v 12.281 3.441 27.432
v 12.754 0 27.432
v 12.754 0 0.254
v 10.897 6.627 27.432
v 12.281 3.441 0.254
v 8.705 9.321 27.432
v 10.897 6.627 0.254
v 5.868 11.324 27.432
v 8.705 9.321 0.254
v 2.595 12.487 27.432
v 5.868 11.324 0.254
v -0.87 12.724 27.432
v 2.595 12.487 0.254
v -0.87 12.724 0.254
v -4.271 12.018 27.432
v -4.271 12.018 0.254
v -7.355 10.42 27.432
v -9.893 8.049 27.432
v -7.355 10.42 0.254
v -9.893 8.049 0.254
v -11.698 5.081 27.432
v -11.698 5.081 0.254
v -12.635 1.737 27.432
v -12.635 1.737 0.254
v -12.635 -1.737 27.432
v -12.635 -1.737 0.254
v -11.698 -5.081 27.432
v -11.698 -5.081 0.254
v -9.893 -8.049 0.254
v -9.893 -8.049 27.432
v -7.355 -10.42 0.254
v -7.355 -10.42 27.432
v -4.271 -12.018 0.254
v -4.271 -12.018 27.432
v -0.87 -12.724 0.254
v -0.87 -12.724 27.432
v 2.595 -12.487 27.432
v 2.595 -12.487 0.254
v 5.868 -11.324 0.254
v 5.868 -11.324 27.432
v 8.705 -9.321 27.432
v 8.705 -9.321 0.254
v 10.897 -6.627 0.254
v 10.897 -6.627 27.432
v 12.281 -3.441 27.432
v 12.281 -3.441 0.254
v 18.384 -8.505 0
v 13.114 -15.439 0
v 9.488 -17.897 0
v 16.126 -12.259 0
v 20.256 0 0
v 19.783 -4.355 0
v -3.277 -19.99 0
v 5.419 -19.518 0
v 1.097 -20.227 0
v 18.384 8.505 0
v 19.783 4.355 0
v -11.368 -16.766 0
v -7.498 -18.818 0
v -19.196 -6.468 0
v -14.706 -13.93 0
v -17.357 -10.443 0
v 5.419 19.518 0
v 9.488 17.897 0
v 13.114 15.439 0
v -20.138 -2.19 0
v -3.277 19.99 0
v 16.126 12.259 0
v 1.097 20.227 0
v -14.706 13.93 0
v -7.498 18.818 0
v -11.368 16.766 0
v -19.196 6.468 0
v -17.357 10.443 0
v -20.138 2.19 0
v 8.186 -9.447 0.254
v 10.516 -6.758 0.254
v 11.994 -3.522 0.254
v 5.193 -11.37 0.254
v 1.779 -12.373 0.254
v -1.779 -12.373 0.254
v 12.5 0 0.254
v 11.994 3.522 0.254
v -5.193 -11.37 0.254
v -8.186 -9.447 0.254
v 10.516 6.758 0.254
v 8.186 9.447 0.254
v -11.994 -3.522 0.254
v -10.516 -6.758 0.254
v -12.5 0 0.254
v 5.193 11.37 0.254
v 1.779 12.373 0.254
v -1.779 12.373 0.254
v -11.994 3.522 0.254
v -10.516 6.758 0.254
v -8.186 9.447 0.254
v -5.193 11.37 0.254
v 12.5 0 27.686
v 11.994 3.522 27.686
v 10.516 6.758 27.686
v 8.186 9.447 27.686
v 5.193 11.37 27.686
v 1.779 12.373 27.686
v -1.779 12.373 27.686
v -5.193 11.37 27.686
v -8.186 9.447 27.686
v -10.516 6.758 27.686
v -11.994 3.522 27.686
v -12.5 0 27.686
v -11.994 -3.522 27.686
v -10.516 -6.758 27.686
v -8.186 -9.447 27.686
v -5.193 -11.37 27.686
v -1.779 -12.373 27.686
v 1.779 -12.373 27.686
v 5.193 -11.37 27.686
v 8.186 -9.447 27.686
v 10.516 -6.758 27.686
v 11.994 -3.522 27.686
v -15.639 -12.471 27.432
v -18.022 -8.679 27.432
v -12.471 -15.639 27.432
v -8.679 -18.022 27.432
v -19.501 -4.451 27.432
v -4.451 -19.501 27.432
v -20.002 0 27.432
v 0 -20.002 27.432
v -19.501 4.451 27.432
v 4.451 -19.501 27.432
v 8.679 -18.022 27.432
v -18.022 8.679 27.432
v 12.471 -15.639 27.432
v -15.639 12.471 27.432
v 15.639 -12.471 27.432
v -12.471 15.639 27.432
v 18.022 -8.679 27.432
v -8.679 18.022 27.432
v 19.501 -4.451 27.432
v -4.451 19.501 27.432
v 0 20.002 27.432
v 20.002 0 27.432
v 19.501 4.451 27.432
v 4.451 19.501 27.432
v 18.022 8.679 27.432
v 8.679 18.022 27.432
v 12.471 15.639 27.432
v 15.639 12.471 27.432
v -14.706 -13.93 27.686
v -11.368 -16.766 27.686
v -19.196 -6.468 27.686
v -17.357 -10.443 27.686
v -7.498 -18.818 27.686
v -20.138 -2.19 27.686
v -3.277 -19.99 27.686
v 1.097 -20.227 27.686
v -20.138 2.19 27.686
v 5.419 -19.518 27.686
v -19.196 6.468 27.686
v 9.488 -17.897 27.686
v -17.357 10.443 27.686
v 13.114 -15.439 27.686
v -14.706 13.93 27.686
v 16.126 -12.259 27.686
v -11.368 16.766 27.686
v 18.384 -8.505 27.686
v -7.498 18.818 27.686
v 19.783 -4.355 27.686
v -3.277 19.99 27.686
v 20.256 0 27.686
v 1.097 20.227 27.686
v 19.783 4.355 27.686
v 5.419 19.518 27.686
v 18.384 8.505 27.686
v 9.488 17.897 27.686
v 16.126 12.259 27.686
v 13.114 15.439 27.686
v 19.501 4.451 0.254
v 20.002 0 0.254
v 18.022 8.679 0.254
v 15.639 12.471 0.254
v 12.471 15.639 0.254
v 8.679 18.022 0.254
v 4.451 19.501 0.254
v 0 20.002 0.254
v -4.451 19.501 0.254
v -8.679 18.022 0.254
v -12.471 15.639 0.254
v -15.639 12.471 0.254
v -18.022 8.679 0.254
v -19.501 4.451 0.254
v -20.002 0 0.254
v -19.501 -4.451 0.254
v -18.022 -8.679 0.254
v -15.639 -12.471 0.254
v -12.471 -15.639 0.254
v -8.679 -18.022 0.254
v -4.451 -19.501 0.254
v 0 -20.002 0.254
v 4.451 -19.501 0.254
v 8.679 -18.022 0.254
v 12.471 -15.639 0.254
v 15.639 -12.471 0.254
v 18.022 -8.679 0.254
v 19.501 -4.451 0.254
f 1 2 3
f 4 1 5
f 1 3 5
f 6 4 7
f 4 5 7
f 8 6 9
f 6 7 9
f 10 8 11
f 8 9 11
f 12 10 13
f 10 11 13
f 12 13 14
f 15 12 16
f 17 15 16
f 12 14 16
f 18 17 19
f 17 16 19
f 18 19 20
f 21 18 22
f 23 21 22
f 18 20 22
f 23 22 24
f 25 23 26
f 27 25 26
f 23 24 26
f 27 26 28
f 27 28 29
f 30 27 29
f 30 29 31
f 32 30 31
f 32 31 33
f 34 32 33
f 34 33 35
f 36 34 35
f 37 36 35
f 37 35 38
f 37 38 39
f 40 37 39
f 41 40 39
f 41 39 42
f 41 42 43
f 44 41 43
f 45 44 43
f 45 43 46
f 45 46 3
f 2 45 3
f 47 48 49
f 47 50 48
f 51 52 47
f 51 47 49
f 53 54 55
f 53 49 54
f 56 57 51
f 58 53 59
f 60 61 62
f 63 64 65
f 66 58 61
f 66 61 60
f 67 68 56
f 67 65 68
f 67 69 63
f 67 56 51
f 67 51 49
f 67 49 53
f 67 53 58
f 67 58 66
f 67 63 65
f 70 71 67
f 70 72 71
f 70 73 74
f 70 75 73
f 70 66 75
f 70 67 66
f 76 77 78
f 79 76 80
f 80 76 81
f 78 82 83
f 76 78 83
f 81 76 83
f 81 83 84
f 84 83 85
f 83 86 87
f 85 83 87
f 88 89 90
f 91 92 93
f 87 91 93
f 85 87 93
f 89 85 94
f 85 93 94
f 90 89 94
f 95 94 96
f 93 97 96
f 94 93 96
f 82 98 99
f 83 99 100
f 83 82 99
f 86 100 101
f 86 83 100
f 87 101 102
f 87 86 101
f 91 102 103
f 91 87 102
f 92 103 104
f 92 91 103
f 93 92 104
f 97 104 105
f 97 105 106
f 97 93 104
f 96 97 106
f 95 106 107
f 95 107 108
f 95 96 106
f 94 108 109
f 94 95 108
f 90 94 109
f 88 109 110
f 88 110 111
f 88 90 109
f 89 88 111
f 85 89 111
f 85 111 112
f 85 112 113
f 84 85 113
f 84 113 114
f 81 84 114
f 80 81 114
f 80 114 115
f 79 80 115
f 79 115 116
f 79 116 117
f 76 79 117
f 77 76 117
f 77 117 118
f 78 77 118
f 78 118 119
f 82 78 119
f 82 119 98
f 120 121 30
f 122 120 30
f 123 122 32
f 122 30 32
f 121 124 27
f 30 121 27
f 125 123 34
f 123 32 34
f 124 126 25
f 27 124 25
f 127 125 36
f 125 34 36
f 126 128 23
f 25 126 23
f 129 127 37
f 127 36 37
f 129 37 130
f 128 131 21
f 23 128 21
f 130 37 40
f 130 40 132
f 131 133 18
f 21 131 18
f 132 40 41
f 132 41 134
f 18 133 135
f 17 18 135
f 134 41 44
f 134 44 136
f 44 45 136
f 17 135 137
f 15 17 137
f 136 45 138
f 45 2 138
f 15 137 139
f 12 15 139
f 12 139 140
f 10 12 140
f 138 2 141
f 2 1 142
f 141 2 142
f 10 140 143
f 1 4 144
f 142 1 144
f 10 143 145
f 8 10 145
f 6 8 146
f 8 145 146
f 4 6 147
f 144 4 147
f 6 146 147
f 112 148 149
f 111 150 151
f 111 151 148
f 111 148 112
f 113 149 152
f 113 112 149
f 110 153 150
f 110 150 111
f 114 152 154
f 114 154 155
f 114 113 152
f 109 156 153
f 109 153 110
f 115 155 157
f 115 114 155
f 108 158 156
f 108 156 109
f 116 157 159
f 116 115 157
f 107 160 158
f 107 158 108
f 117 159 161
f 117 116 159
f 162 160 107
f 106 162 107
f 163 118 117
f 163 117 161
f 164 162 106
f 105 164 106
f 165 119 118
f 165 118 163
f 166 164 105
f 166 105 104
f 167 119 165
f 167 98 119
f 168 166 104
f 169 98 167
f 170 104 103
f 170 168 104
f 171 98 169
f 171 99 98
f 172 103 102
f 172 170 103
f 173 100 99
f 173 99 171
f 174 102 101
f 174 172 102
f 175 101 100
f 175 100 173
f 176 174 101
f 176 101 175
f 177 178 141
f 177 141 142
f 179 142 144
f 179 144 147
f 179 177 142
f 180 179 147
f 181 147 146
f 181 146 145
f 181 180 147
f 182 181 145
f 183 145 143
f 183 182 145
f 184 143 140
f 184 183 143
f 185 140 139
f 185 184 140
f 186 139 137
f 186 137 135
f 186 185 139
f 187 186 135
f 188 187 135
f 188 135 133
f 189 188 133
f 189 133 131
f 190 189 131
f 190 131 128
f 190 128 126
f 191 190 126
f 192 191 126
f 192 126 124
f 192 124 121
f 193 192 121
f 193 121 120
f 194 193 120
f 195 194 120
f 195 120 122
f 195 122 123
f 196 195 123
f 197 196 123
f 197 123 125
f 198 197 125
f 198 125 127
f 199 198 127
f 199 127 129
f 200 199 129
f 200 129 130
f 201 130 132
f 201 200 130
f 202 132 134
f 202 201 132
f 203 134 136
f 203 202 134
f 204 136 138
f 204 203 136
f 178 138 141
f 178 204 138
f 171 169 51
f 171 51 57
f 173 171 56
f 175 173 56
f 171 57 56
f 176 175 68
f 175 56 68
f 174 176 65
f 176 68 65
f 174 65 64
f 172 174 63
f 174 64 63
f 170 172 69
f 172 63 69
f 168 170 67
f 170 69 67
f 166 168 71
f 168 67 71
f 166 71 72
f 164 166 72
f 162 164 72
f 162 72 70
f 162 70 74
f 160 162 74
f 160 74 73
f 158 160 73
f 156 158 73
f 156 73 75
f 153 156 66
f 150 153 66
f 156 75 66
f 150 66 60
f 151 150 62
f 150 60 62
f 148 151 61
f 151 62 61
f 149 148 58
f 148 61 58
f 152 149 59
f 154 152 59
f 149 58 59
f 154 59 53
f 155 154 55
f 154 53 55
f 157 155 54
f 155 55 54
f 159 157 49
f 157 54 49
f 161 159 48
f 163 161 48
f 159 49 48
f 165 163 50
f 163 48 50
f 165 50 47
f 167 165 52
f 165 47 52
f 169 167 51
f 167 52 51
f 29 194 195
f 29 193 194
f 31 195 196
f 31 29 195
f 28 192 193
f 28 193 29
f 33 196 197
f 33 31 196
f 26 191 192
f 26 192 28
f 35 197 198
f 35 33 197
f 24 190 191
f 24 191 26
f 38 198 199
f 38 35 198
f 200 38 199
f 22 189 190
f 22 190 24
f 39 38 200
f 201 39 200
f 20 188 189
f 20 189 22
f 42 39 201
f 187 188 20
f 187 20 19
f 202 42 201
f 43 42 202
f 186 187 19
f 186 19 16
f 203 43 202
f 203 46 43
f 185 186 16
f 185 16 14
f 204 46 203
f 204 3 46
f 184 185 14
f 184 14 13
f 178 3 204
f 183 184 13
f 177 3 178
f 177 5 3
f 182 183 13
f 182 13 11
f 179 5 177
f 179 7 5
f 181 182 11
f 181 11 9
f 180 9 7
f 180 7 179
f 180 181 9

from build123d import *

# Parameters (mm, degrees)
SKETCH1_R           = 20.2565
SKETCH1_R_2         = 12.499975
BOSS_EXTRUDE1_DEPTH = 27.686
SHELL1_T            = -0.254
SKETCH2_R           = 12.499975
BOSS_EXTRUDE2_DEPTH = 0.254
BOSS_EXTRUDE3_START = -0.254
SKETCH3_R           = 20.0025
SKETCH3_R_2         = 12.753975
BOSS_EXTRUDE3_DEPTH = 0.254


with BuildPart() as part:
    # Sketch1 → Boss-Extrude1 (new body)
    with BuildSketch(Plane.XY):
        Circle(SKETCH1_R)
        Circle(SKETCH1_R_2, mode=Mode.SUBTRACT)
    extrude(amount=BOSS_EXTRUDE1_DEPTH)

    # Shell1
    shell1_openings = [part.faces().sort_by_distance(p)[0] for p in [
        (-19.683559659, 0, 27.686),
    ]]
    offset(amount=SHELL1_T, openings=shell1_openings, kind=Kind.INTERSECTION)

    # Sketch2 → Boss-Extrude2 (add)
    with BuildSketch(Plane(origin=(0, 0, 0), x_dir=(-1, 0, 0), z_dir=(0, 0, -1))):
        Circle(SKETCH2_R)
    extrude(amount=-BOSS_EXTRUDE2_DEPTH)

    # Sketch3 → Boss-Extrude3 (add)
    with BuildSketch(Plane.XY.offset(27.686).offset(BOSS_EXTRUDE3_START)):
        Circle(SKETCH3_R)
        Circle(SKETCH3_R_2, mode=Mode.SUBTRACT)
    extrude(amount=BOSS_EXTRUDE3_DEPTH)


solid = part.part
